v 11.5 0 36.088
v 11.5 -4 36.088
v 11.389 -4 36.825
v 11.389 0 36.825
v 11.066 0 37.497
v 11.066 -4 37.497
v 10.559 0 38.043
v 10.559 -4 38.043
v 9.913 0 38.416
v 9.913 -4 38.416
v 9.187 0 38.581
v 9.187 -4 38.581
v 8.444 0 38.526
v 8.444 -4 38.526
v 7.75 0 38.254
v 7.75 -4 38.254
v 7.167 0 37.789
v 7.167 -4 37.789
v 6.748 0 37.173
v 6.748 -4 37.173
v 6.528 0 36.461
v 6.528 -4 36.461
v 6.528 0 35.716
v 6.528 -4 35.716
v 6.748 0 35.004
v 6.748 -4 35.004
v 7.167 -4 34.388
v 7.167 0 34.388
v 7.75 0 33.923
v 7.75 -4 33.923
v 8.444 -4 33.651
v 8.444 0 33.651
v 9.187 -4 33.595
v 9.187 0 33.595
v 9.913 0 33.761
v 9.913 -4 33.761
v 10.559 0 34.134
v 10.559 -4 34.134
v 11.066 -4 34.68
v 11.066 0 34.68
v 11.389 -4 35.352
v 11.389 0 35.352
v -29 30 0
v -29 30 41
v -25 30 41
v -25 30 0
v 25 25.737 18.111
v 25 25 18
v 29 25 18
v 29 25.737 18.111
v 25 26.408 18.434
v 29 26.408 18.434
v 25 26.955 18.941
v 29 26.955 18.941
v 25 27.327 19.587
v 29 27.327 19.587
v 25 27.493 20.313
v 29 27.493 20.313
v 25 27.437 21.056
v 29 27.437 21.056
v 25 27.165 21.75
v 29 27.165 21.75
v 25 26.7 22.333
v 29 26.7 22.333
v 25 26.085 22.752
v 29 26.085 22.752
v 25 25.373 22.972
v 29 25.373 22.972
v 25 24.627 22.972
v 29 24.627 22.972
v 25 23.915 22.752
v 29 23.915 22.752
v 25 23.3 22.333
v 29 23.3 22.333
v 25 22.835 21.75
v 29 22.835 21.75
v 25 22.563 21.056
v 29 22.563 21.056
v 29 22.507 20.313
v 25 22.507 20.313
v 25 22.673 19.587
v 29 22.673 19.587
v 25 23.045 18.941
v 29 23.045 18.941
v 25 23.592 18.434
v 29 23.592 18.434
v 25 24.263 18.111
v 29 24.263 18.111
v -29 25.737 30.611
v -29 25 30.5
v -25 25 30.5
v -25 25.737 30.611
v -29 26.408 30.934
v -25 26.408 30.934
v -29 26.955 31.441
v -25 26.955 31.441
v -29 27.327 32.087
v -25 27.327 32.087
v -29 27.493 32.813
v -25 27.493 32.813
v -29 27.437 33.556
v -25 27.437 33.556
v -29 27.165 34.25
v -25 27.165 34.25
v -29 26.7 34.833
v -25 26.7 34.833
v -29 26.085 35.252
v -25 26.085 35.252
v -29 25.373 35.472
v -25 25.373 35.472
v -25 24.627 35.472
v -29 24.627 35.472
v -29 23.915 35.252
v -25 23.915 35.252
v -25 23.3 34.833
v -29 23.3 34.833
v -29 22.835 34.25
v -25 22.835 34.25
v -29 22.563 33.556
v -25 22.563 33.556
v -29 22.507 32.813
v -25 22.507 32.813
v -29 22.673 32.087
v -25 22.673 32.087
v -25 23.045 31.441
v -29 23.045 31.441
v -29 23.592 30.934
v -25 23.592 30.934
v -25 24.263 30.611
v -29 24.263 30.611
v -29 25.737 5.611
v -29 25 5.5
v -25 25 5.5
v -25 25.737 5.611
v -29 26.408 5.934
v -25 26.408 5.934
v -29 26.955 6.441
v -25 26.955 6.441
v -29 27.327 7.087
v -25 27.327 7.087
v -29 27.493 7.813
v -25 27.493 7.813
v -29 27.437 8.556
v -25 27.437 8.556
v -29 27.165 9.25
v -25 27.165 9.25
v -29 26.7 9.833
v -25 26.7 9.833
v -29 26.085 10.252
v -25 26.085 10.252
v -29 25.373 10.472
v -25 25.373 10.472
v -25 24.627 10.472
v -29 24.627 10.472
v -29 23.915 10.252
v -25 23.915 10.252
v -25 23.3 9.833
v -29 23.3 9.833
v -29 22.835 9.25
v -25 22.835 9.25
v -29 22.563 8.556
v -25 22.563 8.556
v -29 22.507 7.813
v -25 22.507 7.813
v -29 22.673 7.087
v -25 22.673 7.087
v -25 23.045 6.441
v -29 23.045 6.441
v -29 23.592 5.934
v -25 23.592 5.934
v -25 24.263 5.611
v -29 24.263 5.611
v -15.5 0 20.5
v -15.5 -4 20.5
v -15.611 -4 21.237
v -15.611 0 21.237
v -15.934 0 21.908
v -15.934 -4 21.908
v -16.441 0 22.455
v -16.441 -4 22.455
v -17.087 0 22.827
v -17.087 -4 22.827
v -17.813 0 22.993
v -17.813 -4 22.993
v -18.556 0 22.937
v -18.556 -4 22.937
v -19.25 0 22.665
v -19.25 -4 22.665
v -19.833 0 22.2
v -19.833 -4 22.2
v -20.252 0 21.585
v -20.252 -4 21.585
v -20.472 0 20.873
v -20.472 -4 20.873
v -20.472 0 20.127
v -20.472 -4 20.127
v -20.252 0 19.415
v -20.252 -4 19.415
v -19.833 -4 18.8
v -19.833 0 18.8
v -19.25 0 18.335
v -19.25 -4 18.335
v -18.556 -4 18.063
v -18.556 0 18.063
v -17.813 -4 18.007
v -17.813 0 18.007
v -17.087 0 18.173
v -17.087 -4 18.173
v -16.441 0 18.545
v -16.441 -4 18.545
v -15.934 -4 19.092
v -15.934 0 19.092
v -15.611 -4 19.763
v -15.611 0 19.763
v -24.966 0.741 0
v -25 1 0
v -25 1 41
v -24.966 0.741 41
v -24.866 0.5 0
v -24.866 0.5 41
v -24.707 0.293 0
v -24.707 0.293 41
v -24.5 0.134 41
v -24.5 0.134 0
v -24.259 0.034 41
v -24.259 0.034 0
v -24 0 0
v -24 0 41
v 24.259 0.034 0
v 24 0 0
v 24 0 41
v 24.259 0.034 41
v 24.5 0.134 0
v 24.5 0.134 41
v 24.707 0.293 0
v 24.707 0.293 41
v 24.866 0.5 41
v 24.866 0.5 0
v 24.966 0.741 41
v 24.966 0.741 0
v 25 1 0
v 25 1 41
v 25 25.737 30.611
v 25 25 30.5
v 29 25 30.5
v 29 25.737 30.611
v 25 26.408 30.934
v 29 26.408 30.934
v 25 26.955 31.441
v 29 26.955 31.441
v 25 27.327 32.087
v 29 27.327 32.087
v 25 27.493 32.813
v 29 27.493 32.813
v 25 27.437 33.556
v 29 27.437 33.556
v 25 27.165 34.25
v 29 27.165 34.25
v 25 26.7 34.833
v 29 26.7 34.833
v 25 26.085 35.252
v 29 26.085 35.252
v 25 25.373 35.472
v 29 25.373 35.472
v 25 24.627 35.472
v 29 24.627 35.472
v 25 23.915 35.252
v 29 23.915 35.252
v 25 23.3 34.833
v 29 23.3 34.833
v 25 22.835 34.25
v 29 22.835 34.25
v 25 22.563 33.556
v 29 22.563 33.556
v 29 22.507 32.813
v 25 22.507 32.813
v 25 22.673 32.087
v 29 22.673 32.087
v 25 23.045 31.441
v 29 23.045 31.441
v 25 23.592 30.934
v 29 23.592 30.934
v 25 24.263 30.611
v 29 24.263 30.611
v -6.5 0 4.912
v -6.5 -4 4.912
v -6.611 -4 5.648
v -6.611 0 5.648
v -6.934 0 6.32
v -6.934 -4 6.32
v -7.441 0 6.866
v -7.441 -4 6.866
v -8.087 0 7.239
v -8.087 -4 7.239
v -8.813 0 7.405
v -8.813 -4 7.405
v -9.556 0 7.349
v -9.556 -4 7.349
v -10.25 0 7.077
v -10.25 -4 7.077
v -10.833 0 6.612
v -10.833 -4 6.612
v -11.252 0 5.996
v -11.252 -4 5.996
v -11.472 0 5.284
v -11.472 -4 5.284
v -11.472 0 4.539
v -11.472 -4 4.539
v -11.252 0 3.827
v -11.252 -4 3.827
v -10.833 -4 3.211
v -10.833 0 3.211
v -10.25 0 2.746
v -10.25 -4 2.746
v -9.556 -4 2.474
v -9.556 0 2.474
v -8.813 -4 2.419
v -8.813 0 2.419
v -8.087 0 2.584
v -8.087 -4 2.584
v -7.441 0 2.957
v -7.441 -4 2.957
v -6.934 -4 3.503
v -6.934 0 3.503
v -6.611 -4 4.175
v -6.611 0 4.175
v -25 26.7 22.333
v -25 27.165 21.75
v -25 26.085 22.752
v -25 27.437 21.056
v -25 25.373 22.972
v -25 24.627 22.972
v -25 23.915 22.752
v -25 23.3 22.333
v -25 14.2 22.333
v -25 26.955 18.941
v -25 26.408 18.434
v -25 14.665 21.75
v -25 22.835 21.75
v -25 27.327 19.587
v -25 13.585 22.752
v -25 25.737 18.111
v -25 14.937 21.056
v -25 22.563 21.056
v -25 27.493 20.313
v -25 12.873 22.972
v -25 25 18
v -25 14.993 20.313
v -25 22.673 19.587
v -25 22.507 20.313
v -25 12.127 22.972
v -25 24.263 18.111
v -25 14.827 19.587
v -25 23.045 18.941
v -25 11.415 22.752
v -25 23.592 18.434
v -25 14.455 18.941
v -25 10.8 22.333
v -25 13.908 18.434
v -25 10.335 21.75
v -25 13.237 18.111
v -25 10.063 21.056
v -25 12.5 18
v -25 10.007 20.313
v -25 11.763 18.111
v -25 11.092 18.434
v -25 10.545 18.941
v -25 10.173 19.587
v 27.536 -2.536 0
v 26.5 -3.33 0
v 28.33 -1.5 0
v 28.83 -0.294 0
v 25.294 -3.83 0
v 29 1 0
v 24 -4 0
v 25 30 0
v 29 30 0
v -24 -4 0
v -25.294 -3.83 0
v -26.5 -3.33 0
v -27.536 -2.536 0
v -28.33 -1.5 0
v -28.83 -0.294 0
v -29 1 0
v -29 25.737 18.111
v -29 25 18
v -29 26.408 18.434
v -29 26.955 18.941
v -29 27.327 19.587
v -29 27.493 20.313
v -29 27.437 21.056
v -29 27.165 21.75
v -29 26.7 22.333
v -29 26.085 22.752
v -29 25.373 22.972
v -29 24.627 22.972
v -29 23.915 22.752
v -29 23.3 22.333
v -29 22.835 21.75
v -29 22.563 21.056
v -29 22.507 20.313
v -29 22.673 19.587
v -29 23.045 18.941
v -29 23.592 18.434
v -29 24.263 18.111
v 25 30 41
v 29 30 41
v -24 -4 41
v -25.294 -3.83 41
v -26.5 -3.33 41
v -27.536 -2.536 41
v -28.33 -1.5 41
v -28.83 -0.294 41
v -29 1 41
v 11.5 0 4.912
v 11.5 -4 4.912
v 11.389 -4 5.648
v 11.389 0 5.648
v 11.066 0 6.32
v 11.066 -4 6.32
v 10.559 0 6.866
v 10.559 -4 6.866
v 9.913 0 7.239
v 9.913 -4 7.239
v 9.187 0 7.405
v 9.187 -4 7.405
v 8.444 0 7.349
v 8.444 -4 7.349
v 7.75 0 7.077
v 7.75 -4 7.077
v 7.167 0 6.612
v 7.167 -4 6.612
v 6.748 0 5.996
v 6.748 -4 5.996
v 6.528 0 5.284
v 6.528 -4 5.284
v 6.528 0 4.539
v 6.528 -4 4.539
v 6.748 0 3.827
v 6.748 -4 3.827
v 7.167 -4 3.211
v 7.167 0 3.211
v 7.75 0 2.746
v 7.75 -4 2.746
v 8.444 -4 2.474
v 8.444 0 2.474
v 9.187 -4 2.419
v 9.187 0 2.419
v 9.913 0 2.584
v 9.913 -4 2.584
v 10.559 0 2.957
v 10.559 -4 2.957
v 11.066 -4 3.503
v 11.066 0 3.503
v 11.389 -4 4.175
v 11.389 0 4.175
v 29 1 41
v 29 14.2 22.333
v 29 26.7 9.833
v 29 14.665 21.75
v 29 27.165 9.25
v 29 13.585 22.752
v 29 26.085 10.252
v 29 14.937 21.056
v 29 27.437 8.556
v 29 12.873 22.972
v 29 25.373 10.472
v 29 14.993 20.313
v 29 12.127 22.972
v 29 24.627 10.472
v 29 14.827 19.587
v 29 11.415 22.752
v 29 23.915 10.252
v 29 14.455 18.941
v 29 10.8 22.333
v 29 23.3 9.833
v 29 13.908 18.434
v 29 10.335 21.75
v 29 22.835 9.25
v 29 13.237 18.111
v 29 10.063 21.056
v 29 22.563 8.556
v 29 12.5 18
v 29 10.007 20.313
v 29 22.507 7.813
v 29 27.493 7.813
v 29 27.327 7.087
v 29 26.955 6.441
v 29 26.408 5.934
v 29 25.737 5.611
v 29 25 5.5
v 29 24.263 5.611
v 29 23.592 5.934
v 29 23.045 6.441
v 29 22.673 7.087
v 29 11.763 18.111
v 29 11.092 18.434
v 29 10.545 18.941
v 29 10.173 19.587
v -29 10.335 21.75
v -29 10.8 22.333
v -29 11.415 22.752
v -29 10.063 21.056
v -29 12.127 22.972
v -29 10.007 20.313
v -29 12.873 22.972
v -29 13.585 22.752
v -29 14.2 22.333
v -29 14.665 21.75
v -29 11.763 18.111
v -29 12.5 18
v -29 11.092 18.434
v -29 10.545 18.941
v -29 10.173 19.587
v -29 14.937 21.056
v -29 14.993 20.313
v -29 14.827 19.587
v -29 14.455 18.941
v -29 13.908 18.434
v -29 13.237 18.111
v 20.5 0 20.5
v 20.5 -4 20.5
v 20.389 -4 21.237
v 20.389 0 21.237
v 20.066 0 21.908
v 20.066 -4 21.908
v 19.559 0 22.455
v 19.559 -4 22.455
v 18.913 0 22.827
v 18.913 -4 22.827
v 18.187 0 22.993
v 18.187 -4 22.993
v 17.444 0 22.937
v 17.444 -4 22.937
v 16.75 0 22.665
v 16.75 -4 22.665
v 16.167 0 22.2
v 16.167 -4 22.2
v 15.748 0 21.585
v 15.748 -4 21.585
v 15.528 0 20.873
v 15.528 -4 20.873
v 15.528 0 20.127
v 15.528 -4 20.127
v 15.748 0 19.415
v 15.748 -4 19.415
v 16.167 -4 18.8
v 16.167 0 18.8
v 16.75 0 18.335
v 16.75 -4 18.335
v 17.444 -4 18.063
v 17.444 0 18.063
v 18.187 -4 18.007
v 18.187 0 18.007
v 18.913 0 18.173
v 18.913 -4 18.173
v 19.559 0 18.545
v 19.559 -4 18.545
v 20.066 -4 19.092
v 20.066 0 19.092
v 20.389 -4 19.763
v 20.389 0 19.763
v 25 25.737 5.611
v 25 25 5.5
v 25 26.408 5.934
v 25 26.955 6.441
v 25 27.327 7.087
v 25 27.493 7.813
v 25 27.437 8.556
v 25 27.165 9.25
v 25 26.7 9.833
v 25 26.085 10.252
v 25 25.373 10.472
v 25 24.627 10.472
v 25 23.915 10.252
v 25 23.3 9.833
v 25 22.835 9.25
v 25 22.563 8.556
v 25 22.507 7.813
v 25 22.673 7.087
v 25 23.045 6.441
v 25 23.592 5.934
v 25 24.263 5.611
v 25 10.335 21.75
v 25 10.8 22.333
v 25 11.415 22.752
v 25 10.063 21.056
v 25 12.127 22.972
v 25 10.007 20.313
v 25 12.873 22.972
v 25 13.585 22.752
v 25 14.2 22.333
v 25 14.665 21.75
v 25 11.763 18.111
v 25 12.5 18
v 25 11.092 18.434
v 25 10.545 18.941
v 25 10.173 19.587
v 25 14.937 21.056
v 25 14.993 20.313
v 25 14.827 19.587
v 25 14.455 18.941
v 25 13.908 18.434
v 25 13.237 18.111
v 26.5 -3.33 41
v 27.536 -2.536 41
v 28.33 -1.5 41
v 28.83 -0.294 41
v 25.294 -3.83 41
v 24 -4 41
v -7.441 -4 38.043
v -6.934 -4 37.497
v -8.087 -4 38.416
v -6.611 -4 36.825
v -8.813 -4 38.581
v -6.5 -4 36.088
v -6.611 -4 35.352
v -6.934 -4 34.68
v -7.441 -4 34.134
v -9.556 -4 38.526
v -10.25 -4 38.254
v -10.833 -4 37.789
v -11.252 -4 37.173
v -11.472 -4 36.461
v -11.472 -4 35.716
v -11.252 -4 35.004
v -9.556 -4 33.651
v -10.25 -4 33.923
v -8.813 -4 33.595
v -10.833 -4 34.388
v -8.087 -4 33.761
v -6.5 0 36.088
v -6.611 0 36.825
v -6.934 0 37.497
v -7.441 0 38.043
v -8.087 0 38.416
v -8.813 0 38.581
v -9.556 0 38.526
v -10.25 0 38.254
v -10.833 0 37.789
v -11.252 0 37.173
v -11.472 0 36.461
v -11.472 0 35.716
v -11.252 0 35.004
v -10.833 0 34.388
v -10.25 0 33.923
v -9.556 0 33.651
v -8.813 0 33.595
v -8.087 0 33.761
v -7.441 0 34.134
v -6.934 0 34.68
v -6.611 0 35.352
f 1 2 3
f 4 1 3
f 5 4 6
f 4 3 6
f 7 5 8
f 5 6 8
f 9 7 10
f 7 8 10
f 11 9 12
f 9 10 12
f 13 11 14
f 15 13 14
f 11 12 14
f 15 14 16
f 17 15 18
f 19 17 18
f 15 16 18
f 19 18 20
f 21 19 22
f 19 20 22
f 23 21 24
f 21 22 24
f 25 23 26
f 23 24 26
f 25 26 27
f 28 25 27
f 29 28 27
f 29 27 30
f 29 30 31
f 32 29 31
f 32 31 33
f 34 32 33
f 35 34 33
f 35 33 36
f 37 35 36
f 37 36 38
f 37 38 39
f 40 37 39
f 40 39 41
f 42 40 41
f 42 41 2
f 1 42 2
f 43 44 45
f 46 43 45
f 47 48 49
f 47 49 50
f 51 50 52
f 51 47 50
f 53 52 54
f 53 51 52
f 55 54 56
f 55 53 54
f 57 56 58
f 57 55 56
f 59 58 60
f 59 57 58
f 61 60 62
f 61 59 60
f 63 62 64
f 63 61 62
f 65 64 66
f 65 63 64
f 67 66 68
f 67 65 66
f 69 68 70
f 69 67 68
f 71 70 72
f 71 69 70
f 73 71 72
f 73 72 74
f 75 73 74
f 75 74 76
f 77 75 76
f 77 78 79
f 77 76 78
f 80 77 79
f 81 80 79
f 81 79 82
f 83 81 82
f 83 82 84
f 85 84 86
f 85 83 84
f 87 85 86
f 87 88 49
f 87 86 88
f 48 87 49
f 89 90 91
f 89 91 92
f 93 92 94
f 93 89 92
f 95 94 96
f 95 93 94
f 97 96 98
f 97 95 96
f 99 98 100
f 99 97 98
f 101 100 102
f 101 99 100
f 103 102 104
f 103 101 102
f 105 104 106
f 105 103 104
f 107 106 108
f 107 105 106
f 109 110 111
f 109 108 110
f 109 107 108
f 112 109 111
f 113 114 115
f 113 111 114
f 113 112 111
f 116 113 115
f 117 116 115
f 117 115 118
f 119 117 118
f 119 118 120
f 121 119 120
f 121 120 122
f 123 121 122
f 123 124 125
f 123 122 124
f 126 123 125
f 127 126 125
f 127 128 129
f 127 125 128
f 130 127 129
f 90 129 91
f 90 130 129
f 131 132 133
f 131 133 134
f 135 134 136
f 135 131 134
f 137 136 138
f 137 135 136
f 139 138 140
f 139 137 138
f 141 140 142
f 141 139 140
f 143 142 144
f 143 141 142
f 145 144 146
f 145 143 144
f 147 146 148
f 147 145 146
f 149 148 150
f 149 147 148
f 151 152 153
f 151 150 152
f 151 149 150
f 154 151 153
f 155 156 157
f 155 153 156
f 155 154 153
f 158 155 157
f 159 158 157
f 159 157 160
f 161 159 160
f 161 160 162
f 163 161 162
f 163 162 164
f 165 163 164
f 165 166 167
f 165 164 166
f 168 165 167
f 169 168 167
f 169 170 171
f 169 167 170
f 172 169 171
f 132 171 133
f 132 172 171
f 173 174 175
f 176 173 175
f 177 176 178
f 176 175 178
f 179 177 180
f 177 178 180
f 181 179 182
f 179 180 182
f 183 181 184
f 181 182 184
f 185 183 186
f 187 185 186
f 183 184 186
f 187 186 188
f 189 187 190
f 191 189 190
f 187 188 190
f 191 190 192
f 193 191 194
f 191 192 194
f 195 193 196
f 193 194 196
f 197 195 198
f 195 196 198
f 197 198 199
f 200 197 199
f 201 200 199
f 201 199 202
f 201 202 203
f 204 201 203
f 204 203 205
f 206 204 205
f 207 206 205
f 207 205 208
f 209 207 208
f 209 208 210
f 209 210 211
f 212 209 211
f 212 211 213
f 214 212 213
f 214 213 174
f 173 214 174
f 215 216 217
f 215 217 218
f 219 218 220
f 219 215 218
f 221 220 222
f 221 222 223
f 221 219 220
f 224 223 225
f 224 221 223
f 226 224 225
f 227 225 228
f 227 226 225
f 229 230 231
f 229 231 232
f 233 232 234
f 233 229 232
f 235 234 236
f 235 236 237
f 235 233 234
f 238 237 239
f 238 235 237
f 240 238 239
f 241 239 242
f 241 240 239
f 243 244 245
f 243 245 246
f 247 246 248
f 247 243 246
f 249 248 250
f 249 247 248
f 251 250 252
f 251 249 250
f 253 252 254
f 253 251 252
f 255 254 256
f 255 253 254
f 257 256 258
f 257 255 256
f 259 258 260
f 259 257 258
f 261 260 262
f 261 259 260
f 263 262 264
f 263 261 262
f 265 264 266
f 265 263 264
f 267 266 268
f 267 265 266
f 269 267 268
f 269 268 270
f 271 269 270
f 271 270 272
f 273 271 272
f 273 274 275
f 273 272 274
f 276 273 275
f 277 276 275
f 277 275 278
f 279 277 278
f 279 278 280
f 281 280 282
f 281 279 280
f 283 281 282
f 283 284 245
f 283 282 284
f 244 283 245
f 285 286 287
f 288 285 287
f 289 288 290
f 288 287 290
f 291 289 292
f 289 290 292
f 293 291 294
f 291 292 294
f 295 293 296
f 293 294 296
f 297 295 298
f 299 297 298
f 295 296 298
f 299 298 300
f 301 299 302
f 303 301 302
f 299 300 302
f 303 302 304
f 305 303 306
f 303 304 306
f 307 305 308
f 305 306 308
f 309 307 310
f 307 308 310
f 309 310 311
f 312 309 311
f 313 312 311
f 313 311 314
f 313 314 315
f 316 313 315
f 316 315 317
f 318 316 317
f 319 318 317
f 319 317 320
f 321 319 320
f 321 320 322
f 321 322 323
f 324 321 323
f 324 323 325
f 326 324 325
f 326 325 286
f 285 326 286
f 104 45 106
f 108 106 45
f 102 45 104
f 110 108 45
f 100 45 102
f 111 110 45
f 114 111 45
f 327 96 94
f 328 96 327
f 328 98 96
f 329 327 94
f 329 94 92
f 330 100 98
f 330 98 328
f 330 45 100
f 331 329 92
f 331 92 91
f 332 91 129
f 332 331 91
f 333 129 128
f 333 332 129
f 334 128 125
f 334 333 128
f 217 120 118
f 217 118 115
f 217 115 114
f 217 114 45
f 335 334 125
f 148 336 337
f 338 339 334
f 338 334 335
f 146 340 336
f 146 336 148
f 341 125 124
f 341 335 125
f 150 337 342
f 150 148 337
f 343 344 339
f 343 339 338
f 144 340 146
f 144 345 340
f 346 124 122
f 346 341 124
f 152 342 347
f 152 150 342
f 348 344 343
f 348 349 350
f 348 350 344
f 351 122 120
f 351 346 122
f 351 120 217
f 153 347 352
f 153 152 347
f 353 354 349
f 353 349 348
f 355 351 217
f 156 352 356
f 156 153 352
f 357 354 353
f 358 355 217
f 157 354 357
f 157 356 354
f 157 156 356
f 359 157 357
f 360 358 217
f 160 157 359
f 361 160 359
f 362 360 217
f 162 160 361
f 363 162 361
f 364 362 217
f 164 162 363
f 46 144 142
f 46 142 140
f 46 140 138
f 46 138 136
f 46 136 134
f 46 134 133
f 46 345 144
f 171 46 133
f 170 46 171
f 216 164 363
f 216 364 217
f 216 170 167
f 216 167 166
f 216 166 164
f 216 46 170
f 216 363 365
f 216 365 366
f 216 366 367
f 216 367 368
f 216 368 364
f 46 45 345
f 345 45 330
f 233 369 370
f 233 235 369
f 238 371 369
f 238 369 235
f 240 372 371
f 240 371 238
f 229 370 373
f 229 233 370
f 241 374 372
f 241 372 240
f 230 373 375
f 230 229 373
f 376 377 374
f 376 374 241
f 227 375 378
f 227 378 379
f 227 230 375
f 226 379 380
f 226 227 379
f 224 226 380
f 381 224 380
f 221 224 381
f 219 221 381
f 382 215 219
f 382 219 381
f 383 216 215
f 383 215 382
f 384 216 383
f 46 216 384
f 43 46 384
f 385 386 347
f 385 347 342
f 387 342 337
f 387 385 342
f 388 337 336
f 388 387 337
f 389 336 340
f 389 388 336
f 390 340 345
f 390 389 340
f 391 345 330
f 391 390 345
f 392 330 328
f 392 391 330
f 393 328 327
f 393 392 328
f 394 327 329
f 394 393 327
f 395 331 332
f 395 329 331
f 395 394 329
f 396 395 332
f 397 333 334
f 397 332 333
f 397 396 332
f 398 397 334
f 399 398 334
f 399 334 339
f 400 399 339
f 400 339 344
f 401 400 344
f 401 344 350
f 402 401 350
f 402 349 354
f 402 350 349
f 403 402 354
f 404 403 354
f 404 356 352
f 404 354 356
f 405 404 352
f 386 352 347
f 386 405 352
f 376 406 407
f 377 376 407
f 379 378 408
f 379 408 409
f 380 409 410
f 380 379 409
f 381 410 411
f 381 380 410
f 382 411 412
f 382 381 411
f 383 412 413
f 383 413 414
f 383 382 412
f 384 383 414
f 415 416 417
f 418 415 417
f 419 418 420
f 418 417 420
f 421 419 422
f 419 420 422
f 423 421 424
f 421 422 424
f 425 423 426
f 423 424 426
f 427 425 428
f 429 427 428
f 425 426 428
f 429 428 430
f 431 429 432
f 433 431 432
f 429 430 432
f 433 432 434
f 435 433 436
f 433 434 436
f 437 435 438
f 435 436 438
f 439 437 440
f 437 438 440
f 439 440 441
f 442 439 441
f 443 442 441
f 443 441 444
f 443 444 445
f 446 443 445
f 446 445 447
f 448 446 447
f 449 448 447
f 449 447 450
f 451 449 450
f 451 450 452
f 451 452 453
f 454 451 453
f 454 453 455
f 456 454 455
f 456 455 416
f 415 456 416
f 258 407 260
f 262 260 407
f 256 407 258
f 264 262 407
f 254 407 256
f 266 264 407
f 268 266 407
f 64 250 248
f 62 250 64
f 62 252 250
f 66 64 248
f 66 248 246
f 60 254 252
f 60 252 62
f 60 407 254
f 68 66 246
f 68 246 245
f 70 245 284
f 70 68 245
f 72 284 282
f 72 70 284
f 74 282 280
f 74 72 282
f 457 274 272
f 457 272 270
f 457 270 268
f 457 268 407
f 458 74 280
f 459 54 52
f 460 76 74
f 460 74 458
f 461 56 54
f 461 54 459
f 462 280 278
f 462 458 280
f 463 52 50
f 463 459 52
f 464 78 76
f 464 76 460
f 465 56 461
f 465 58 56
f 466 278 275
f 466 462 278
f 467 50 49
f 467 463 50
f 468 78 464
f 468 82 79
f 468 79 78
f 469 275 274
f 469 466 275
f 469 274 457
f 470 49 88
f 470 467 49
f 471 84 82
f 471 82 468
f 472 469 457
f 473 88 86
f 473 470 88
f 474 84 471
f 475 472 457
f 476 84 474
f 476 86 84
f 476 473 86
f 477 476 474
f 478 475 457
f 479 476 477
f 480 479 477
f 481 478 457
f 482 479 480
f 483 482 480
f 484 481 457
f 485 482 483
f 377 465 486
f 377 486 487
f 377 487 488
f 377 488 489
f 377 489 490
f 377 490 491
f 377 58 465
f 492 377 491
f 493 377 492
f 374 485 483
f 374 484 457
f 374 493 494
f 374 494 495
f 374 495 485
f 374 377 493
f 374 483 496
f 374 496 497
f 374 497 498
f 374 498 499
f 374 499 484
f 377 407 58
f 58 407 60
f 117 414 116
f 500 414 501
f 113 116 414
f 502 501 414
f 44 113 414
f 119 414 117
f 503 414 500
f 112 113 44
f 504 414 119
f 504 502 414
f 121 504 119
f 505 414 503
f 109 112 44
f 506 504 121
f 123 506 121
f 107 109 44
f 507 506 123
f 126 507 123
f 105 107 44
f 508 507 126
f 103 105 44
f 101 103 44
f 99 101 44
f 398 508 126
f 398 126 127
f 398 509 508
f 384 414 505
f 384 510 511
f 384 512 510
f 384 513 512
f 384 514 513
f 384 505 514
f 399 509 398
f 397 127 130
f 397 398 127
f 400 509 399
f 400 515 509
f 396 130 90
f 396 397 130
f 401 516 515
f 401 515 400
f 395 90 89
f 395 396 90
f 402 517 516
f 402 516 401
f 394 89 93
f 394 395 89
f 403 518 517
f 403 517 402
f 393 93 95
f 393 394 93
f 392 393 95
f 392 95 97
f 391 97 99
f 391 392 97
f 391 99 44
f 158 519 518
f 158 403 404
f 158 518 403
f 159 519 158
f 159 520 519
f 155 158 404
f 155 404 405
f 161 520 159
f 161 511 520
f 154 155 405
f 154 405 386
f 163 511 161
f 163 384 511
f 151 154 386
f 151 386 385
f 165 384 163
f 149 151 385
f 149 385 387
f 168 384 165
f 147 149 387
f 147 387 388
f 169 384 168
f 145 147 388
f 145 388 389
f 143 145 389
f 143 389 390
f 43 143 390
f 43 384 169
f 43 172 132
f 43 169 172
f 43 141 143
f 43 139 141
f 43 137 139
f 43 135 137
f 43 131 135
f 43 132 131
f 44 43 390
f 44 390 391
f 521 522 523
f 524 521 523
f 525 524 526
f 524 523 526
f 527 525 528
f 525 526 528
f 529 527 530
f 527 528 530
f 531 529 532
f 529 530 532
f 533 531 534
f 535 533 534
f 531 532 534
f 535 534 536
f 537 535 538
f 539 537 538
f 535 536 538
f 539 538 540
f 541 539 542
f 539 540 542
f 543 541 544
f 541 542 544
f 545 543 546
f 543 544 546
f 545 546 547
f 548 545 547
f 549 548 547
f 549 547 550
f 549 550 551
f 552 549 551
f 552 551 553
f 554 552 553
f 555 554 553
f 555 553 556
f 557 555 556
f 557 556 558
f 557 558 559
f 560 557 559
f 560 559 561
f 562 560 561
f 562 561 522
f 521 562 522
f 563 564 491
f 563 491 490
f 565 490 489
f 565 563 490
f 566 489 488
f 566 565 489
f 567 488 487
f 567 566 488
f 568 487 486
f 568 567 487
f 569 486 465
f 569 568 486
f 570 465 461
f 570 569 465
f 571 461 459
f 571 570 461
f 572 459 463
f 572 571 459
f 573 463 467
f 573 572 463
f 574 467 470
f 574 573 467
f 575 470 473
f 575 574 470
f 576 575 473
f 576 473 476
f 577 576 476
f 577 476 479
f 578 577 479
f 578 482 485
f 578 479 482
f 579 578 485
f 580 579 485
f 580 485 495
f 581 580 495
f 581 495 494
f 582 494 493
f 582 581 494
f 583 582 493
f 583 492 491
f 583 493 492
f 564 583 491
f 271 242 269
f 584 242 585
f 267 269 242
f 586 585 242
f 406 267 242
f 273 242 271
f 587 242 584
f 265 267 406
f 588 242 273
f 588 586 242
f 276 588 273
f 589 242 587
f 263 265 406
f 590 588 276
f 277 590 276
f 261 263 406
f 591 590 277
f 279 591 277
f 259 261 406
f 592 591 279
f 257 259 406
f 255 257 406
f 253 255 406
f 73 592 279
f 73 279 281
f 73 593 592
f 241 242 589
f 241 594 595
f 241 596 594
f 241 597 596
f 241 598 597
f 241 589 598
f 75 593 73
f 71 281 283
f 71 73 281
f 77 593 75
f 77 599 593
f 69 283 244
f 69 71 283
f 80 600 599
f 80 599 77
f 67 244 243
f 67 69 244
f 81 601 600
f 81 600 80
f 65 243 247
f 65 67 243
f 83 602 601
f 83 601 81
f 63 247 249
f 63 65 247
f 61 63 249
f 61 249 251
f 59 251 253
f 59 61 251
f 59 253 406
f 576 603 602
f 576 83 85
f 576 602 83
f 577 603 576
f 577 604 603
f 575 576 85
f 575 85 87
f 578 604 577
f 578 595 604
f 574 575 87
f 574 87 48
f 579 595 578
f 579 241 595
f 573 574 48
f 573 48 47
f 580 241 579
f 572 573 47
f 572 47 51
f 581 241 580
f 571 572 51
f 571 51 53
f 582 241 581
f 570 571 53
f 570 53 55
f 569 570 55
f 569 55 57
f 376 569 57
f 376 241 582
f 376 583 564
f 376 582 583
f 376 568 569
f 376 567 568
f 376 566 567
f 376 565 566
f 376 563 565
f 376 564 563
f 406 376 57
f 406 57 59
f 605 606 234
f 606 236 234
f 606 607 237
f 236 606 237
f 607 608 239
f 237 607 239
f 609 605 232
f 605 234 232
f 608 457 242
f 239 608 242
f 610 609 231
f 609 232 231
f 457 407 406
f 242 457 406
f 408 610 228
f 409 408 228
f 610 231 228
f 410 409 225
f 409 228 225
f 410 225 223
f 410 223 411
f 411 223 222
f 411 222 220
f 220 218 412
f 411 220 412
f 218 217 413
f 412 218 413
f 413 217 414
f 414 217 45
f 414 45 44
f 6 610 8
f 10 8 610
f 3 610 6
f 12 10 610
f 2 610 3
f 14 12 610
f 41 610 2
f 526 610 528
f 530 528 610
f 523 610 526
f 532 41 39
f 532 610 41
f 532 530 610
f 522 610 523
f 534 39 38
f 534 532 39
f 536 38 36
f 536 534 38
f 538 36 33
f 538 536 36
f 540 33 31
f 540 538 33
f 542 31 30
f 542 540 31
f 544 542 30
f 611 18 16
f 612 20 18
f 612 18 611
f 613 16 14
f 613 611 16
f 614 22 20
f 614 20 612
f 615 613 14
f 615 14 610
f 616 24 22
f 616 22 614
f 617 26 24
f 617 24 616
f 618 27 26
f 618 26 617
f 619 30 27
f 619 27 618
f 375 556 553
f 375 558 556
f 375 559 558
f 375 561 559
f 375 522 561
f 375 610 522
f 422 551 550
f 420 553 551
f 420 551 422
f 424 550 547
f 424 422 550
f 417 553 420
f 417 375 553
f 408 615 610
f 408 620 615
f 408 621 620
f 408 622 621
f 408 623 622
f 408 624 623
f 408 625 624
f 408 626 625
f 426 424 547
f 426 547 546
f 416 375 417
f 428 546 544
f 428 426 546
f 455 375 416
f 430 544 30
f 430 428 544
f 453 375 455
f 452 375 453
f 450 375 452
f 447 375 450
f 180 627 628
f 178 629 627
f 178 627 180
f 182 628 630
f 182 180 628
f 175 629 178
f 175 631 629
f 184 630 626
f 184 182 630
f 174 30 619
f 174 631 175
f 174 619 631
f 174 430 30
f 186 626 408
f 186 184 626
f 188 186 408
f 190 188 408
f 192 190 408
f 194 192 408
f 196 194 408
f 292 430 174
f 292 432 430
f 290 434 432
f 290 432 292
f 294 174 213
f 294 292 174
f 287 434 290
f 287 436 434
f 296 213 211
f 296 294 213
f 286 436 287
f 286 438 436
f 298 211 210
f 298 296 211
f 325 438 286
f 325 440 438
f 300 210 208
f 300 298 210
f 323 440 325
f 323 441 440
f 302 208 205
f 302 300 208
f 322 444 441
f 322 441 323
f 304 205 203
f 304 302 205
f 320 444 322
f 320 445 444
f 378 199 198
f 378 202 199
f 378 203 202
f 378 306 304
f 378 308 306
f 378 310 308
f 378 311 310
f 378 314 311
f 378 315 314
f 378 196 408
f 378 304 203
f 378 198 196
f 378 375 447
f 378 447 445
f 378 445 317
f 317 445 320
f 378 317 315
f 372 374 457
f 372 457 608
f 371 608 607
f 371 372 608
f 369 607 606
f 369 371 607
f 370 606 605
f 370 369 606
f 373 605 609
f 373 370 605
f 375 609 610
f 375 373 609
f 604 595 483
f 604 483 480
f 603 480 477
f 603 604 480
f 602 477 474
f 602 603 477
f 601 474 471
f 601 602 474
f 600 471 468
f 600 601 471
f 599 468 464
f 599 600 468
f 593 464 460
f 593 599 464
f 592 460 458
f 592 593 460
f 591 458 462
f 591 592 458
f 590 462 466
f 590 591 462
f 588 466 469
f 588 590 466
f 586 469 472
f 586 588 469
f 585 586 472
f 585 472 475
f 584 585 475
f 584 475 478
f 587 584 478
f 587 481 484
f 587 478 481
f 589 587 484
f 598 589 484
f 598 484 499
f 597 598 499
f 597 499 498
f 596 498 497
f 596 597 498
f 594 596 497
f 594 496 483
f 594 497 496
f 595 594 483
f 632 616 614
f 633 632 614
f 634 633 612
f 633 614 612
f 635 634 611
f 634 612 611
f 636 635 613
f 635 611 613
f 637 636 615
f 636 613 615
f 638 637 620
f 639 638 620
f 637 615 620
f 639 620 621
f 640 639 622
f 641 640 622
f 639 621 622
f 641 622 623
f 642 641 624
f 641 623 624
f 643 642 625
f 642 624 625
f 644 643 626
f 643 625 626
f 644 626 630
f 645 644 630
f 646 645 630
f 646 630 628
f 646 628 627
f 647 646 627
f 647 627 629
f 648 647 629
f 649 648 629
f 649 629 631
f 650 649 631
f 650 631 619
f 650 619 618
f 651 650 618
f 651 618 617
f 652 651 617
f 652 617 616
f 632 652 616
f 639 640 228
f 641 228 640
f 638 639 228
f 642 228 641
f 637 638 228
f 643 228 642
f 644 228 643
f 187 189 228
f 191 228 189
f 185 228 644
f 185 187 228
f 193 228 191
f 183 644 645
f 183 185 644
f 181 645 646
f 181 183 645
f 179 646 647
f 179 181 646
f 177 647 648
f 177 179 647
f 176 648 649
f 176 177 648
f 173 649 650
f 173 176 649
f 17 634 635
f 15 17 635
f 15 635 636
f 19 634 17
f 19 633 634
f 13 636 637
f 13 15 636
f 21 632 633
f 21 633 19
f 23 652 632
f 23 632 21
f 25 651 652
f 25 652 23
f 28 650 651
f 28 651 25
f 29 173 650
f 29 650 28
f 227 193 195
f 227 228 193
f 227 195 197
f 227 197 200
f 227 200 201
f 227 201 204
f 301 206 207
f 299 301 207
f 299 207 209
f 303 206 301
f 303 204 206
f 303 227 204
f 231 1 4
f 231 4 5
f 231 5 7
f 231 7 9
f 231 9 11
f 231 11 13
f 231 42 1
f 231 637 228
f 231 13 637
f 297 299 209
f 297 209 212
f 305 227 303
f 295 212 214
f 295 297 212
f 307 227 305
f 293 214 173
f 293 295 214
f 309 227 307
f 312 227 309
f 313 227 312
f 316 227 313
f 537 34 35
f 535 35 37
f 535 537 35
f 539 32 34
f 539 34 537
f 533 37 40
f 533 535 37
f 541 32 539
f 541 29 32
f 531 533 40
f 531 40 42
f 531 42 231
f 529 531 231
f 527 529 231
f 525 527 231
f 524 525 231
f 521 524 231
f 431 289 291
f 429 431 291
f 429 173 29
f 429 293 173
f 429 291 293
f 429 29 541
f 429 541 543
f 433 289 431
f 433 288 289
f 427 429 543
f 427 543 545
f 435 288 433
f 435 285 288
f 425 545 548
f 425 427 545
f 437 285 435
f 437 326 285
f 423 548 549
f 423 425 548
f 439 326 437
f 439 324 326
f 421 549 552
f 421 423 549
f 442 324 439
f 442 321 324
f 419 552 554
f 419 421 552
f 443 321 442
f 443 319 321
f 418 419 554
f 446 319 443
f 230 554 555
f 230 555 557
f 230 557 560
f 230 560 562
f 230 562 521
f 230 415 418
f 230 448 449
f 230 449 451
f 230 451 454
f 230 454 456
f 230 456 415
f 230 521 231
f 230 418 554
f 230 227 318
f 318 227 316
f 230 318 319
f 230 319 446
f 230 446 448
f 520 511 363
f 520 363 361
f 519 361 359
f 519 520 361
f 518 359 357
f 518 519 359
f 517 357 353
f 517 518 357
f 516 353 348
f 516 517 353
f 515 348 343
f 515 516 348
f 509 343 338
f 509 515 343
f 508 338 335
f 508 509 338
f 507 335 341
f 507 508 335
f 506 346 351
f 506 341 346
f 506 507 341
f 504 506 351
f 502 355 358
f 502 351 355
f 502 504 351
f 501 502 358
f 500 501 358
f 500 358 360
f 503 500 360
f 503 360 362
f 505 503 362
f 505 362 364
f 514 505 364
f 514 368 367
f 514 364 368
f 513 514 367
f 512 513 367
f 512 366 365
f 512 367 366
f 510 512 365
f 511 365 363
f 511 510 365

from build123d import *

# Parameters (mm, degrees)
SM_BASE_FLANGE_1_DEPTH   = 41
SKETCH_9_R               = 2.5
CUT_EXTRUDE_4_DEPTH      = 61.6465168
CUT_EXTRUDE_5_DEPTH      = 78.103826105
CUT_EXTRUDE_5_DEPTH_BACK = 78.103826105
SKETCH_10_R              = 2.5


# Sheet-metal steps are written as plain solids
with BuildPart() as part:
    # Sketch 1 → Базовая кромка1 (new body)
    with BuildSketch(Plane.XY):
        with BuildLine():
            Line((-25, 30), (-25, 1))
            ThreePointArc((-25, 1), (-24.707106781, 0.292893219), (-24, 0))
            Line((-24, 0), (24, 0))
            ThreePointArc((24, 0), (24.707106781, 0.292893219), (25, 1))
            Line((25, 1), (25, 30))
            Line((25, 30), (29, 30))
            Line((29, 30), (29, 1))
            ThreePointArc((29, 1), (27.535533906, -2.535533906), (24, -4))
            Line((24, -4), (-24, -4))
            ThreePointArc((-24, -4), (-27.535533906, -2.535533906), (-29, 1))
            Line((-29, 1), (-29, 30))
            Line((-29, 30), (-25, 30))
        make_face()
    extrude(amount=SM_BASE_FLANGE_1_DEPTH)

    # Эскиз9 → Вырез-Вытянуть4 (cut, through all)
    with BuildSketch(Plane.XZ.offset(4)):
        with Locations((-18, 20.5)):
            Circle(SKETCH_9_R)
        with Locations((-9, 36.088457268)):
            Circle(SKETCH_9_R)
        with Locations((9, 36.088457268)):
            Circle(SKETCH_9_R)
        with Locations((18, 20.5)):
            Circle(SKETCH_9_R)
        with Locations((9, 4.911542732)):
            Circle(SKETCH_9_R)
        with Locations((-9, 4.911542732)):
            Circle(SKETCH_9_R)
    extrude(amount=-CUT_EXTRUDE_4_DEPTH, mode=Mode.SUBTRACT)

    # Эскиз10 → Вырез-Вытянуть5 (cut, two sides: drawn at the far end of the back side and taken through both)
    with BuildSketch(Plane(origin=(29, 0, 0), x_dir=(0, 0, -1), z_dir=(1, 0, 0)).offset(-CUT_EXTRUDE_5_DEPTH_BACK)):
        with Locations((-33, 25)):
            Circle(SKETCH_10_R)
        with Locations((-20.5, 25)):
            Circle(SKETCH_10_R)
        with Locations((-8, 25)):
            Circle(SKETCH_10_R)
        with Locations((-20.5, 12.5)):
            Circle(SKETCH_10_R)
    extrude(amount=CUT_EXTRUDE_5_DEPTH + CUT_EXTRUDE_5_DEPTH_BACK, mode=Mode.SUBTRACT)


solid = part.part
